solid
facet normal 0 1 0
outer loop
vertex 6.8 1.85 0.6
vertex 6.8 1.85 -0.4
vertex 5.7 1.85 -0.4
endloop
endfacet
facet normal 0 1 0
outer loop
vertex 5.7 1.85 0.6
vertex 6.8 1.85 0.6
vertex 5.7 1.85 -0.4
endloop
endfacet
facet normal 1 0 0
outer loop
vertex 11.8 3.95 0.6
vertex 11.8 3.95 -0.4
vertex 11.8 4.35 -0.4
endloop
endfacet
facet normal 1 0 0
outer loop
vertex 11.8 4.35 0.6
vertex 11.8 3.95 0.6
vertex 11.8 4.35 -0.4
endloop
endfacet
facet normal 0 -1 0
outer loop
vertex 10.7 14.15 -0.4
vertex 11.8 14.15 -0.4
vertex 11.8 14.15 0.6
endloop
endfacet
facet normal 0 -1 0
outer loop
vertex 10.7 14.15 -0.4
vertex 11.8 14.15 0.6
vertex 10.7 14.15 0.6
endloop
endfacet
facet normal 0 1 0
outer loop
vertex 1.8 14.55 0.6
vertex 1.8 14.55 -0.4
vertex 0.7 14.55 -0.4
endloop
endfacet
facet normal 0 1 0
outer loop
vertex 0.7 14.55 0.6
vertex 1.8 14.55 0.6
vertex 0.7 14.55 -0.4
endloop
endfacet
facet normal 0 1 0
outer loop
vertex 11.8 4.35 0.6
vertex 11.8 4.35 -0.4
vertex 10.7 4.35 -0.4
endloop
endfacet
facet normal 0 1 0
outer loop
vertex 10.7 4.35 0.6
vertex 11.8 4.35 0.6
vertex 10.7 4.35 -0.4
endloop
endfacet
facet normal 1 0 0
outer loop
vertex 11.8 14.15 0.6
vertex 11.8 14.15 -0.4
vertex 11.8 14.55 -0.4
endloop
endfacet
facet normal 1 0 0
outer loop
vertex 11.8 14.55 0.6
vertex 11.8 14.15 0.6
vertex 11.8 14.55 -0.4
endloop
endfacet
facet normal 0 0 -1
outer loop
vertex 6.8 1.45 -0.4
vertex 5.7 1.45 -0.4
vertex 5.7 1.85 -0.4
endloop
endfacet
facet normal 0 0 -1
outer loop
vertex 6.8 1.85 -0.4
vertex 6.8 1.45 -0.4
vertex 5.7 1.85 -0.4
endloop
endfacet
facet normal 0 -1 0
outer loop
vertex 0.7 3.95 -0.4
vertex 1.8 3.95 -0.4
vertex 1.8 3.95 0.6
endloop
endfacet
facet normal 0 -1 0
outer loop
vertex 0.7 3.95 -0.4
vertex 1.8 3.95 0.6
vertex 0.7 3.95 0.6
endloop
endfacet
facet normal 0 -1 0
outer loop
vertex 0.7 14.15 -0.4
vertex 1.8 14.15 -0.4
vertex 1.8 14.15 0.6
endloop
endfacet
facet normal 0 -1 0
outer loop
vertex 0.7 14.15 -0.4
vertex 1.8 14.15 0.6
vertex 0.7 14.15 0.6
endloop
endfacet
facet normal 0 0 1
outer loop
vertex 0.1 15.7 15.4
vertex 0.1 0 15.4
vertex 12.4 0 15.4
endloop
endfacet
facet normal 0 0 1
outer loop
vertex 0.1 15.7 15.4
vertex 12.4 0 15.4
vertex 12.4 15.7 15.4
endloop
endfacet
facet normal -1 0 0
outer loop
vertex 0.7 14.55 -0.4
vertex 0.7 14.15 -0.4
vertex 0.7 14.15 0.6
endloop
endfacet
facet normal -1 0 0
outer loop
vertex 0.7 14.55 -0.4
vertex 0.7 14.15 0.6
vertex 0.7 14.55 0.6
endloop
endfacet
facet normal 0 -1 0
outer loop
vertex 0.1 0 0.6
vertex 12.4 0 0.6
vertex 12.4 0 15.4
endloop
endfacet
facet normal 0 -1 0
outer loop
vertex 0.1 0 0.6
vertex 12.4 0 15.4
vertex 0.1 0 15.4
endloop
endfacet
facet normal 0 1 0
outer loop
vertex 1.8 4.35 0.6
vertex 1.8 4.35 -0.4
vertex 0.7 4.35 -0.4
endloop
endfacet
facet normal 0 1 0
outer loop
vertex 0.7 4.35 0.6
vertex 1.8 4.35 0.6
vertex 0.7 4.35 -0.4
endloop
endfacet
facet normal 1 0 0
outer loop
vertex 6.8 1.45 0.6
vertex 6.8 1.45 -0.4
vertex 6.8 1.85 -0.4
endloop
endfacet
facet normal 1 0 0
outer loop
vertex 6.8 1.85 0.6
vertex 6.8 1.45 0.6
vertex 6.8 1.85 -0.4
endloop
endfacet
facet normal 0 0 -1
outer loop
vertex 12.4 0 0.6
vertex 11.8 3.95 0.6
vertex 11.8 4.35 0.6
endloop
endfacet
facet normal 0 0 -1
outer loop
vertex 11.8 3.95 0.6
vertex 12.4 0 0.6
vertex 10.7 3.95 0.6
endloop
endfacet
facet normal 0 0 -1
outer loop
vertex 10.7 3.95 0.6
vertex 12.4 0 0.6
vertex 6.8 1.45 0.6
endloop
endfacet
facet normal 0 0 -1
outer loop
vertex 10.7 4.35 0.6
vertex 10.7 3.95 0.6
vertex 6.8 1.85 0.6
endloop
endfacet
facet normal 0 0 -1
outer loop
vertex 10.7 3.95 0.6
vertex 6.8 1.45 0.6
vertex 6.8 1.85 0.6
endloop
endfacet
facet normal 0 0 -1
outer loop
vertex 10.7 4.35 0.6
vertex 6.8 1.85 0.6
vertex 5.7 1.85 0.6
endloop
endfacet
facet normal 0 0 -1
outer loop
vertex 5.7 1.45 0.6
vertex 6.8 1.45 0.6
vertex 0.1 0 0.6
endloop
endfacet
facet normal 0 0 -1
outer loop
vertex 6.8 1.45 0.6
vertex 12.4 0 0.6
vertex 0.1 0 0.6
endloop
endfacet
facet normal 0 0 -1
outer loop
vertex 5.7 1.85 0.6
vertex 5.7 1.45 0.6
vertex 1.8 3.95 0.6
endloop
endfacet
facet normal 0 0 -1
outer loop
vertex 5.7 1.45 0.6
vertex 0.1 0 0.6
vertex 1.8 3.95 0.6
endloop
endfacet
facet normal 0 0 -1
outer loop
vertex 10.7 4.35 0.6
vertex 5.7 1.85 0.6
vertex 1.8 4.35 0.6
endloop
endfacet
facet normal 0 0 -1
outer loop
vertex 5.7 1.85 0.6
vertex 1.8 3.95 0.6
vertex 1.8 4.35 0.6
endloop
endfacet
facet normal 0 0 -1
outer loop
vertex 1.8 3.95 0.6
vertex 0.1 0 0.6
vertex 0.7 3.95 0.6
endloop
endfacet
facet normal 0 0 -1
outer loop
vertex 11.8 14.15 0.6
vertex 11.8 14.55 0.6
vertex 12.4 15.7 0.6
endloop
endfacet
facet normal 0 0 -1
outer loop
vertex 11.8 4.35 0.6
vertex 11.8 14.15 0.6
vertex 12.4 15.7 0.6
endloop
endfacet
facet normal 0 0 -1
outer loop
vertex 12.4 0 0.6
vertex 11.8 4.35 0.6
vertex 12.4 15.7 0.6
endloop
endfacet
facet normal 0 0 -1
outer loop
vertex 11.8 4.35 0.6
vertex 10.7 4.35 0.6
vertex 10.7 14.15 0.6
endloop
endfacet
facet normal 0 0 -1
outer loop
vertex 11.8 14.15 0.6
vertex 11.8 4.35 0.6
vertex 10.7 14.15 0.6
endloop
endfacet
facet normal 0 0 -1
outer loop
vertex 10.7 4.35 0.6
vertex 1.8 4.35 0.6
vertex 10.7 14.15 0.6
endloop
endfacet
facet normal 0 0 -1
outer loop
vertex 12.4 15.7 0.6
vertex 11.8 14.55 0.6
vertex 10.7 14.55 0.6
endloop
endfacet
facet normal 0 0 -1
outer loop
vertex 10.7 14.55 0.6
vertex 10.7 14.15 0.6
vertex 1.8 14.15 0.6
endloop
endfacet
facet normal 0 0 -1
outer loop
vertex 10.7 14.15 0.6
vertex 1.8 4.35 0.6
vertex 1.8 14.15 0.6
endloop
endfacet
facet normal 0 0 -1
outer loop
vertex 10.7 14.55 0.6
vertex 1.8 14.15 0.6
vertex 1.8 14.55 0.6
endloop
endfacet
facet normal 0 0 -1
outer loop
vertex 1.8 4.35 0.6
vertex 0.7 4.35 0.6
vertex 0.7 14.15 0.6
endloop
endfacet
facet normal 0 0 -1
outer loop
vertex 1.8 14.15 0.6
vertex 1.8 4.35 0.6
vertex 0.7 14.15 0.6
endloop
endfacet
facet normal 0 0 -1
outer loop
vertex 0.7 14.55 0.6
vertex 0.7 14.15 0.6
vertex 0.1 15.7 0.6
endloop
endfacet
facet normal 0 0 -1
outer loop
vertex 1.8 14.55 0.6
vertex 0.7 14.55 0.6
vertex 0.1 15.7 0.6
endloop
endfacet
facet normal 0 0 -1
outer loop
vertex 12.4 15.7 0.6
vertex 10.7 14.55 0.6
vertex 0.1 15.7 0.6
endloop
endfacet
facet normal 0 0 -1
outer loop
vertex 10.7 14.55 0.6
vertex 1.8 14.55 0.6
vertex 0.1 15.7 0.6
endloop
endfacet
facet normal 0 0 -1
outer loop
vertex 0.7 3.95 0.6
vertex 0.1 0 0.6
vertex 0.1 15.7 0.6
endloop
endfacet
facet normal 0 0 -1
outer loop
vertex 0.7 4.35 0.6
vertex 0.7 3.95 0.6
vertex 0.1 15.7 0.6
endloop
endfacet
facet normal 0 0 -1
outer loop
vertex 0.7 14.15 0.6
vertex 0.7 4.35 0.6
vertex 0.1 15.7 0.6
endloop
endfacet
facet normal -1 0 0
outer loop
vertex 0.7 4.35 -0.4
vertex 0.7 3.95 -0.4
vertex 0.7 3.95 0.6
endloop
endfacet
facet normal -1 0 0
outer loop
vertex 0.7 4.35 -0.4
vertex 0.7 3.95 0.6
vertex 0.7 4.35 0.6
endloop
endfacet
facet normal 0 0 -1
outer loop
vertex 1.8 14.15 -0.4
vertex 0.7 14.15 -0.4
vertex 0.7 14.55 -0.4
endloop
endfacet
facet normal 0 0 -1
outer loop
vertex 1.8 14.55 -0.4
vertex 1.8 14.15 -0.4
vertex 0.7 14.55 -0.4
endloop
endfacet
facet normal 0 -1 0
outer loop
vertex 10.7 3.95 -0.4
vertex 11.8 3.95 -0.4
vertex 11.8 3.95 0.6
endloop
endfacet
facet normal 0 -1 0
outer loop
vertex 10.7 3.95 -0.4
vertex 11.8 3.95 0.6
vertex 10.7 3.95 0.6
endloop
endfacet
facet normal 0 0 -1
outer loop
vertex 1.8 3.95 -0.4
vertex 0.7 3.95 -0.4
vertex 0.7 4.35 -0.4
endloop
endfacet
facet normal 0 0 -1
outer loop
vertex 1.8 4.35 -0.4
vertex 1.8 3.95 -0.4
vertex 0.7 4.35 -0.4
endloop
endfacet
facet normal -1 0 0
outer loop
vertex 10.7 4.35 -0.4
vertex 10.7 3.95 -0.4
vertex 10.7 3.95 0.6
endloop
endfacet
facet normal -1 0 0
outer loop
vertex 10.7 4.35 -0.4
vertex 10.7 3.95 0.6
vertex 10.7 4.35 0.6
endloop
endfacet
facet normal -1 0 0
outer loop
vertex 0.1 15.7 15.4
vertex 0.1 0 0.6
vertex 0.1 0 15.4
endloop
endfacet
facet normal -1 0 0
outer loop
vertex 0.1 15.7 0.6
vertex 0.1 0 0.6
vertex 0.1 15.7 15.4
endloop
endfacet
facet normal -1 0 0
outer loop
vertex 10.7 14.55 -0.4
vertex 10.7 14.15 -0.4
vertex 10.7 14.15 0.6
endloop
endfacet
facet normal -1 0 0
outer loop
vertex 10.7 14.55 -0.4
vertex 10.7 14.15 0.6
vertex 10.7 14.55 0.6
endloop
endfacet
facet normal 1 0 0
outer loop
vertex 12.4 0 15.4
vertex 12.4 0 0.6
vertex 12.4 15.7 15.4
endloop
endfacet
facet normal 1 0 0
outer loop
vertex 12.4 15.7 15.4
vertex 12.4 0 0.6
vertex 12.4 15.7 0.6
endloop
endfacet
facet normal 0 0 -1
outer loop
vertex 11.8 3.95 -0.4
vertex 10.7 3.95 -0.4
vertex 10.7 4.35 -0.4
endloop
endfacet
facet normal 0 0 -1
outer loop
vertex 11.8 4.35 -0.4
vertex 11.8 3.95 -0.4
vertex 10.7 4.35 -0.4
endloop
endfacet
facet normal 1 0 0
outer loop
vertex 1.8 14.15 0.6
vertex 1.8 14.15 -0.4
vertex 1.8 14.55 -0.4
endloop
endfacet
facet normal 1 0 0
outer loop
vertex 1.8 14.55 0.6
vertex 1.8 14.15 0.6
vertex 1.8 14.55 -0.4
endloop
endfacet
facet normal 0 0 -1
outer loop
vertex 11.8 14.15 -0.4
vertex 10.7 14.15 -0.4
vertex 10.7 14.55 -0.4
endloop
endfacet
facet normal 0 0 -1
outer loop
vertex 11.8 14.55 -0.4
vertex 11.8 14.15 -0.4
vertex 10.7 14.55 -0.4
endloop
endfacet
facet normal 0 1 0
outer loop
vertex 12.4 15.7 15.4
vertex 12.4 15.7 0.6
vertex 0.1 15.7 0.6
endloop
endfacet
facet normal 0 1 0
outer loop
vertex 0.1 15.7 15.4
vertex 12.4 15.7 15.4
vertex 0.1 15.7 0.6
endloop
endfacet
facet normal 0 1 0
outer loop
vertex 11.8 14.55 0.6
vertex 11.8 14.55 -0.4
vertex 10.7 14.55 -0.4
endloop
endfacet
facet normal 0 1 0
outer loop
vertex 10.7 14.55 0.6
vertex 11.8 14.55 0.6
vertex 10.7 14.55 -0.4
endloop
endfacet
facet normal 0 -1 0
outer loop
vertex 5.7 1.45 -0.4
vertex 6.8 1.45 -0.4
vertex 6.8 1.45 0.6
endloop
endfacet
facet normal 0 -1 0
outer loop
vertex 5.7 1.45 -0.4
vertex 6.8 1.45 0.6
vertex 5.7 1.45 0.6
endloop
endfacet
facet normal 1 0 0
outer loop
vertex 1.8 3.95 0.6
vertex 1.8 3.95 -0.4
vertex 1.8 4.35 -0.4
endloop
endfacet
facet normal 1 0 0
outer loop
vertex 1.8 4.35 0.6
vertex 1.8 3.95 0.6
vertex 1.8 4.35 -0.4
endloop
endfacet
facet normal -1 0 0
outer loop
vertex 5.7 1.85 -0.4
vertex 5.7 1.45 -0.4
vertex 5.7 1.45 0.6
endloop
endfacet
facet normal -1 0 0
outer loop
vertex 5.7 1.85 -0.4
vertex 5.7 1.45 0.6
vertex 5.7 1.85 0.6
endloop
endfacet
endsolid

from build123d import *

# Parameters (mm, degrees)
BOX007_W                  = 0.4
BOX007_H                  = 1.1
BOX007_DEPTH              = 2.5
BOX005_W                  = 0.4
BOX005_H                  = 1.1
BOX005_DEPTH              = 2.5
BOX006_W                  = 0.4
BOX006_H                  = 1.1
BOX006_DEPTH              = 2.5
BOX008_W                  = 0.4
BOX008_H                  = 1.1
BOX008_DEPTH              = 2.5
BOX004_W                  = 15.7
BOX004_H                  = 12.3
BOX004_DEPTH              = 14.8
BOX009_W                  = 0.4
BOX009_H                  = 1.1
BOX009_DEPTH              = 2.5
FUSION001_PLACEMENT_ANGLE = 90


with BuildPart() as pata004:
    # Box007 → Box007 (new body)
    with BuildSketch(Plane(origin=(3.95, 10.6, -2), x_dir=(1, 0, 0), z_dir=(0, 0, 1))):
        with Locations((0.2, 0.55)):
            Rectangle(BOX007_W, BOX007_H)
    extrude(amount=BOX007_DEPTH)


with BuildPart() as pata002:
    # Box005 → Box005 (new body)
    with BuildSketch(Plane(origin=(1.45, 5.6, -2), x_dir=(1, 0, 0), z_dir=(0, 0, 1))):
        with Locations((0.2, 0.55)):
            Rectangle(BOX005_W, BOX005_H)
    extrude(amount=BOX005_DEPTH)


with BuildPart() as pata003:
    # Box006 → Box006 (new body)
    with BuildSketch(Plane(origin=(14.15, 10.6, -2), x_dir=(1, 0, 0), z_dir=(0, 0, 1))):
        with Locations((0.2, 0.55)):
            Rectangle(BOX006_W, BOX006_H)
    extrude(amount=BOX006_DEPTH)


with BuildPart() as pata005:
    # Box008 → Box008 (new body)
    with BuildSketch(Plane(origin=(14.15, 0.6, -2), x_dir=(1, 0, 0), z_dir=(0, 0, 1))):
        with Locations((0.2, 0.55)):
            Rectangle(BOX008_W, BOX008_H)
    extrude(amount=BOX008_DEPTH)


with BuildPart() as cuerpo:
    # Box004 → Box004 (new body)
    with BuildSketch(Plane.XY.offset(-1)):
        with Locations((7.85, 6.15)):
            Rectangle(BOX004_W, BOX004_H)
    extrude(amount=BOX004_DEPTH)


with BuildPart() as relay:
    # Box009 → Box009 (new body)
    with BuildSketch(Plane(origin=(3.95, 0.6, -2), x_dir=(1, 0, 0), z_dir=(0, 0, 1))):
        with Locations((0.2, 0.55)):
            Rectangle(BOX009_W, BOX009_H)
    extrude(amount=BOX009_DEPTH)

    # Fusion001: union pata004, pata002, pata003, pata005, cuerpo
    add(pata004.part)
    add(pata002.part)
    add(pata003.part)
    add(pata005.part)
    add(cuerpo.part)


with BuildPart() as relay_1:
    # Fusion001 placement: moved
    add(relay.part.moved(Location((12.4, 0, 1.6))).rotate(Axis((12.4, 0, 1.6), (0, 0, 1)), FUSION001_PLACEMENT_ANGLE))


solid = relay_1.part
